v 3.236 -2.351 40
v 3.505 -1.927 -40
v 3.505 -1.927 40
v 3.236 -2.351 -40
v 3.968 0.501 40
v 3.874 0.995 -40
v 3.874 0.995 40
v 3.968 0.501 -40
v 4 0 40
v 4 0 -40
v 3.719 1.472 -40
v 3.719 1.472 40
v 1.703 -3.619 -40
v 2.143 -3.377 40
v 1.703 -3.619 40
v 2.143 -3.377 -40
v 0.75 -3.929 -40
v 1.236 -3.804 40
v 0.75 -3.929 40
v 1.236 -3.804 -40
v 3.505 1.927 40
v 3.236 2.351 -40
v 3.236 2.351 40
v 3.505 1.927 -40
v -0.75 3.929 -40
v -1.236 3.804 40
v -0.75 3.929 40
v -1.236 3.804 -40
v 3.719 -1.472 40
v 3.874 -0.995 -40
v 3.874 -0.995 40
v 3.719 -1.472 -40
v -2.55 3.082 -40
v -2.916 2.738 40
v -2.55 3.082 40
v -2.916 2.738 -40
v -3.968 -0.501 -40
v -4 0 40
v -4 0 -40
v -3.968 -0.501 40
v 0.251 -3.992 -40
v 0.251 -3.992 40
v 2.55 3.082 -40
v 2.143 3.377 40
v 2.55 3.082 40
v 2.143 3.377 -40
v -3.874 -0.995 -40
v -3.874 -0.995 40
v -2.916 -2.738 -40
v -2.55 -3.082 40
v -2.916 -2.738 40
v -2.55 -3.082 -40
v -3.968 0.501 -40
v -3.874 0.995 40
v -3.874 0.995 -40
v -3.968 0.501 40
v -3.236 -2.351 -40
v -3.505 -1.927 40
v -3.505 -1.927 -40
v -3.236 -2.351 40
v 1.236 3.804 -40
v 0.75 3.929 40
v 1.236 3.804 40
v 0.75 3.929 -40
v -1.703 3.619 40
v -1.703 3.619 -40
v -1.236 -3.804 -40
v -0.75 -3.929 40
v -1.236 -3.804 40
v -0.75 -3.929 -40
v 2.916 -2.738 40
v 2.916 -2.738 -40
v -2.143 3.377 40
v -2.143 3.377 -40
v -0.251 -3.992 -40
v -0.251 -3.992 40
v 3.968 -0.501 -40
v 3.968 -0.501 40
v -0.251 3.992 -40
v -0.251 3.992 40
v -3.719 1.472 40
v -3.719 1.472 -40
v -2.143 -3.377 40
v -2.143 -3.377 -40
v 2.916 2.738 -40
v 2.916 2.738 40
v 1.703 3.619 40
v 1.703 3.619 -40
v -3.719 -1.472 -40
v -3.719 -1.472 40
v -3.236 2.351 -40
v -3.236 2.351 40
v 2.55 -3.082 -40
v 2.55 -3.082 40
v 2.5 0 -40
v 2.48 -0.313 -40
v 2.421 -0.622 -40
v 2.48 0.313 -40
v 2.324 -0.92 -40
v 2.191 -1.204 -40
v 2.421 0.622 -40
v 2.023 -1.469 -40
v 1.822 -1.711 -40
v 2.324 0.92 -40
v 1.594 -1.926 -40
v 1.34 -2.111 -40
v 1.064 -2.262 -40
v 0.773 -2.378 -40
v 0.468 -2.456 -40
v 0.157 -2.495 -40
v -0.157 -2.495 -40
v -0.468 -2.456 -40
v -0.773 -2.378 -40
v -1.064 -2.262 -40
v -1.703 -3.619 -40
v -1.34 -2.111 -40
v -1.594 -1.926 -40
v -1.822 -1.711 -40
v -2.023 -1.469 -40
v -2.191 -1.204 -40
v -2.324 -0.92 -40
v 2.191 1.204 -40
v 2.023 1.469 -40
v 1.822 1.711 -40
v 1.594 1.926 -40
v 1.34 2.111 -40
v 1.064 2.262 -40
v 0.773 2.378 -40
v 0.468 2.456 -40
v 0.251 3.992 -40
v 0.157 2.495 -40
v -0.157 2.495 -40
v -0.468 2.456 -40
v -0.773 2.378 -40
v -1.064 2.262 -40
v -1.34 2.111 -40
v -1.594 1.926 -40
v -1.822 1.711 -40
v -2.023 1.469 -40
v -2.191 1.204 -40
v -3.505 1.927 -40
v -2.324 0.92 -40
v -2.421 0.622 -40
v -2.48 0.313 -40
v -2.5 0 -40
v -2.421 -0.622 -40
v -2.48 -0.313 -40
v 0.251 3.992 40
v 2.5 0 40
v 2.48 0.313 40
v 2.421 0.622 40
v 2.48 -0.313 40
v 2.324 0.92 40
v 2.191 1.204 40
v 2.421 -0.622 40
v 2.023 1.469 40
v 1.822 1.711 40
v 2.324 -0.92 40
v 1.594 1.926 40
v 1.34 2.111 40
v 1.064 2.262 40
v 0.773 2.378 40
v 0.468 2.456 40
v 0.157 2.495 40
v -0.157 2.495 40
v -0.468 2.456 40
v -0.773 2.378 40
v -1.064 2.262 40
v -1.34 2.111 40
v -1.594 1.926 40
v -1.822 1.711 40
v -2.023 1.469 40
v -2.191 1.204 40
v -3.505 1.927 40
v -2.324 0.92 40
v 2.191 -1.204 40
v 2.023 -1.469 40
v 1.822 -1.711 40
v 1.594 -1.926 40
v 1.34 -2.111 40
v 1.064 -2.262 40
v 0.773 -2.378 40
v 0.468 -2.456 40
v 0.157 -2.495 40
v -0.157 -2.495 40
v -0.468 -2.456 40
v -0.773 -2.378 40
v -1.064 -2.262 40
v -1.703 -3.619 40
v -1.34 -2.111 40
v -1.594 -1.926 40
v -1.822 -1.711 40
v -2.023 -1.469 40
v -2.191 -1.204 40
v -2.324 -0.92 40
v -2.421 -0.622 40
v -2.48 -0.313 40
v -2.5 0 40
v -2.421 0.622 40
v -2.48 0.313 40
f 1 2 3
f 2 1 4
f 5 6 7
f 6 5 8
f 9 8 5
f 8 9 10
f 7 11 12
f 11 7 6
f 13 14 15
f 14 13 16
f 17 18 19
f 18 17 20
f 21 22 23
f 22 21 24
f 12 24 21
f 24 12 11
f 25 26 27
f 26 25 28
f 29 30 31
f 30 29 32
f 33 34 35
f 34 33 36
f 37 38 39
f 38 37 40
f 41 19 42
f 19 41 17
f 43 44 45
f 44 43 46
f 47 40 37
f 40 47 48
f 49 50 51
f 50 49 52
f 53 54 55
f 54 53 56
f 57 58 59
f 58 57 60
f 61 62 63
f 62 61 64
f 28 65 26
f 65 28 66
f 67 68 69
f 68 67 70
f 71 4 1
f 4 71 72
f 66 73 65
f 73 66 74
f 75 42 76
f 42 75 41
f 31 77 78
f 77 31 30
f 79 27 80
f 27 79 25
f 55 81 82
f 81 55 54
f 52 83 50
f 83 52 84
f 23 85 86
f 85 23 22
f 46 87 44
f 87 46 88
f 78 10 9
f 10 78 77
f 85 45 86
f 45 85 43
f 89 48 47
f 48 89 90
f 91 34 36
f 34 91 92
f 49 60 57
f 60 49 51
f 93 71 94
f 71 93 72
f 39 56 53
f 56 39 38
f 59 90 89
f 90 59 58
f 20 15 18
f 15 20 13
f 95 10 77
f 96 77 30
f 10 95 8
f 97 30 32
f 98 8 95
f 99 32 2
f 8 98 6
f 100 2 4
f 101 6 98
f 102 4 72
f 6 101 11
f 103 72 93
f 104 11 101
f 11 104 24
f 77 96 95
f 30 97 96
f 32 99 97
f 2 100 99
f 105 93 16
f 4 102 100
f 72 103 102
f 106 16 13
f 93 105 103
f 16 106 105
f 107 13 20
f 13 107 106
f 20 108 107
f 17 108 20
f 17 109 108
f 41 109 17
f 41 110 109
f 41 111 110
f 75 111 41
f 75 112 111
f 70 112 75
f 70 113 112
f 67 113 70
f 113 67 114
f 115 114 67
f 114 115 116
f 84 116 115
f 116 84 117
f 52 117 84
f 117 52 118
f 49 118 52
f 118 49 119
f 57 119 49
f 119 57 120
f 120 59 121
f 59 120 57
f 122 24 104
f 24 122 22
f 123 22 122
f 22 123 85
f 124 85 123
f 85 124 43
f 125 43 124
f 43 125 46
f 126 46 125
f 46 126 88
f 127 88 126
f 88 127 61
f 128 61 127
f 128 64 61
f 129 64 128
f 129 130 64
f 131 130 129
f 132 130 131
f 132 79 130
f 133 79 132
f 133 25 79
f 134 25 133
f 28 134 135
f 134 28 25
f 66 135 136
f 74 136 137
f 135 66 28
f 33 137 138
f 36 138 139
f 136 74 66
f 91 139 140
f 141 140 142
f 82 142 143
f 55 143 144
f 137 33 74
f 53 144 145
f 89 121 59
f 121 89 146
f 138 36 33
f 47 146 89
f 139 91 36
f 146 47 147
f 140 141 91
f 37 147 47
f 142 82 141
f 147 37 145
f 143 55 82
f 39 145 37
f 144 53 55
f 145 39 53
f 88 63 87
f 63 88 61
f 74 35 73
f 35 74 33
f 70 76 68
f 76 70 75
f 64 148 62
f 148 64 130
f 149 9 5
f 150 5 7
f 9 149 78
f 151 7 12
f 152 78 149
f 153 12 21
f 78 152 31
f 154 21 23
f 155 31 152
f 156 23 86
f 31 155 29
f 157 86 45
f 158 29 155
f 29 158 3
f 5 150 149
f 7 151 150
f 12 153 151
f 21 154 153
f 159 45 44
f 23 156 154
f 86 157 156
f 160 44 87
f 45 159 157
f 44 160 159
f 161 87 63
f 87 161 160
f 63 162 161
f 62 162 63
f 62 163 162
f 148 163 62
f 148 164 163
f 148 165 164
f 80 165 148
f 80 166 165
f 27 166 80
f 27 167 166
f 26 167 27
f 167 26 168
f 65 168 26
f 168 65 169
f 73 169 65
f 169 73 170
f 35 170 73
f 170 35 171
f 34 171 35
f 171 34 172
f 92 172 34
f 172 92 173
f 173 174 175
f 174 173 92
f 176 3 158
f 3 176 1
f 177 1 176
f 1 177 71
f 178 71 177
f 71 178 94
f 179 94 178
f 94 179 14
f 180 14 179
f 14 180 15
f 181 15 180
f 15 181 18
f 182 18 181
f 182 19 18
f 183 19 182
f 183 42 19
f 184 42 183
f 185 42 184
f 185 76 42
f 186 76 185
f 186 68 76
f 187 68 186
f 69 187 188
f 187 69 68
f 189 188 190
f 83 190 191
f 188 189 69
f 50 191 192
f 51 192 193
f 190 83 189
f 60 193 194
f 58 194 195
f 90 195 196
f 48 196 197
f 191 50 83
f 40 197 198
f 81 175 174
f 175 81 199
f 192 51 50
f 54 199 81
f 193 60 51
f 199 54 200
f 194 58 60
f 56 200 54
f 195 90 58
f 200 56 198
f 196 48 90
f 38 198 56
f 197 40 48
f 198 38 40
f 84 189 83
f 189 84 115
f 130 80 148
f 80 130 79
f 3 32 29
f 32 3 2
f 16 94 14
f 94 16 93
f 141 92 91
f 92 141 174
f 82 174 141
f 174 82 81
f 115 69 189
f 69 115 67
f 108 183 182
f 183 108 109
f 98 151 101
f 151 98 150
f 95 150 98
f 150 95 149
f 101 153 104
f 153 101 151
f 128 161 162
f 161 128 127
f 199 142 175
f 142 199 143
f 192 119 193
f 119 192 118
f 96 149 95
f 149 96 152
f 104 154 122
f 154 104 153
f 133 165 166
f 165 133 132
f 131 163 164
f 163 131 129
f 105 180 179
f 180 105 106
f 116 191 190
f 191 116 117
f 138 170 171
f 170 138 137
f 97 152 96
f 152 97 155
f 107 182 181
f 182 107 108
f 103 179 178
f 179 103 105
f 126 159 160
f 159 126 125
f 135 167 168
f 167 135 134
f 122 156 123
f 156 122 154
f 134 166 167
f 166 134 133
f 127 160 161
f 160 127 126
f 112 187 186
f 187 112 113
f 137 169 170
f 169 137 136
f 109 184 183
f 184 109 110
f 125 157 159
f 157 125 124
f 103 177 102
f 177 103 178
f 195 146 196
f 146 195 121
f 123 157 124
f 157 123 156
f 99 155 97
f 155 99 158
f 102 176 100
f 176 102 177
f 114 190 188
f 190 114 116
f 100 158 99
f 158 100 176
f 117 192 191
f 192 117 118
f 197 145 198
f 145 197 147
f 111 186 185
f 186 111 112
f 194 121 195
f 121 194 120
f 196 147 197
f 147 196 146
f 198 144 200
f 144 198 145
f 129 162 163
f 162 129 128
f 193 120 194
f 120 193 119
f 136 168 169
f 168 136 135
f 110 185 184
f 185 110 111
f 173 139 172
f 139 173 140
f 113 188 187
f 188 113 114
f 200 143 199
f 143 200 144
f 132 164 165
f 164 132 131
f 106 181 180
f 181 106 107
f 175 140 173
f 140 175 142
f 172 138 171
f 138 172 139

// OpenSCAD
$fn = 50;


difference() {
	union() {
		translate(v = [0, 0, -40.0000000000]) {
			cylinder(h = 80, r = 4.0000000000);
		}
	}
	union() {
		translate(v = [0, 0, -100.0000000000]) {
			cylinder(h = 200, r = 2.5000000000);
		}
	}
}
